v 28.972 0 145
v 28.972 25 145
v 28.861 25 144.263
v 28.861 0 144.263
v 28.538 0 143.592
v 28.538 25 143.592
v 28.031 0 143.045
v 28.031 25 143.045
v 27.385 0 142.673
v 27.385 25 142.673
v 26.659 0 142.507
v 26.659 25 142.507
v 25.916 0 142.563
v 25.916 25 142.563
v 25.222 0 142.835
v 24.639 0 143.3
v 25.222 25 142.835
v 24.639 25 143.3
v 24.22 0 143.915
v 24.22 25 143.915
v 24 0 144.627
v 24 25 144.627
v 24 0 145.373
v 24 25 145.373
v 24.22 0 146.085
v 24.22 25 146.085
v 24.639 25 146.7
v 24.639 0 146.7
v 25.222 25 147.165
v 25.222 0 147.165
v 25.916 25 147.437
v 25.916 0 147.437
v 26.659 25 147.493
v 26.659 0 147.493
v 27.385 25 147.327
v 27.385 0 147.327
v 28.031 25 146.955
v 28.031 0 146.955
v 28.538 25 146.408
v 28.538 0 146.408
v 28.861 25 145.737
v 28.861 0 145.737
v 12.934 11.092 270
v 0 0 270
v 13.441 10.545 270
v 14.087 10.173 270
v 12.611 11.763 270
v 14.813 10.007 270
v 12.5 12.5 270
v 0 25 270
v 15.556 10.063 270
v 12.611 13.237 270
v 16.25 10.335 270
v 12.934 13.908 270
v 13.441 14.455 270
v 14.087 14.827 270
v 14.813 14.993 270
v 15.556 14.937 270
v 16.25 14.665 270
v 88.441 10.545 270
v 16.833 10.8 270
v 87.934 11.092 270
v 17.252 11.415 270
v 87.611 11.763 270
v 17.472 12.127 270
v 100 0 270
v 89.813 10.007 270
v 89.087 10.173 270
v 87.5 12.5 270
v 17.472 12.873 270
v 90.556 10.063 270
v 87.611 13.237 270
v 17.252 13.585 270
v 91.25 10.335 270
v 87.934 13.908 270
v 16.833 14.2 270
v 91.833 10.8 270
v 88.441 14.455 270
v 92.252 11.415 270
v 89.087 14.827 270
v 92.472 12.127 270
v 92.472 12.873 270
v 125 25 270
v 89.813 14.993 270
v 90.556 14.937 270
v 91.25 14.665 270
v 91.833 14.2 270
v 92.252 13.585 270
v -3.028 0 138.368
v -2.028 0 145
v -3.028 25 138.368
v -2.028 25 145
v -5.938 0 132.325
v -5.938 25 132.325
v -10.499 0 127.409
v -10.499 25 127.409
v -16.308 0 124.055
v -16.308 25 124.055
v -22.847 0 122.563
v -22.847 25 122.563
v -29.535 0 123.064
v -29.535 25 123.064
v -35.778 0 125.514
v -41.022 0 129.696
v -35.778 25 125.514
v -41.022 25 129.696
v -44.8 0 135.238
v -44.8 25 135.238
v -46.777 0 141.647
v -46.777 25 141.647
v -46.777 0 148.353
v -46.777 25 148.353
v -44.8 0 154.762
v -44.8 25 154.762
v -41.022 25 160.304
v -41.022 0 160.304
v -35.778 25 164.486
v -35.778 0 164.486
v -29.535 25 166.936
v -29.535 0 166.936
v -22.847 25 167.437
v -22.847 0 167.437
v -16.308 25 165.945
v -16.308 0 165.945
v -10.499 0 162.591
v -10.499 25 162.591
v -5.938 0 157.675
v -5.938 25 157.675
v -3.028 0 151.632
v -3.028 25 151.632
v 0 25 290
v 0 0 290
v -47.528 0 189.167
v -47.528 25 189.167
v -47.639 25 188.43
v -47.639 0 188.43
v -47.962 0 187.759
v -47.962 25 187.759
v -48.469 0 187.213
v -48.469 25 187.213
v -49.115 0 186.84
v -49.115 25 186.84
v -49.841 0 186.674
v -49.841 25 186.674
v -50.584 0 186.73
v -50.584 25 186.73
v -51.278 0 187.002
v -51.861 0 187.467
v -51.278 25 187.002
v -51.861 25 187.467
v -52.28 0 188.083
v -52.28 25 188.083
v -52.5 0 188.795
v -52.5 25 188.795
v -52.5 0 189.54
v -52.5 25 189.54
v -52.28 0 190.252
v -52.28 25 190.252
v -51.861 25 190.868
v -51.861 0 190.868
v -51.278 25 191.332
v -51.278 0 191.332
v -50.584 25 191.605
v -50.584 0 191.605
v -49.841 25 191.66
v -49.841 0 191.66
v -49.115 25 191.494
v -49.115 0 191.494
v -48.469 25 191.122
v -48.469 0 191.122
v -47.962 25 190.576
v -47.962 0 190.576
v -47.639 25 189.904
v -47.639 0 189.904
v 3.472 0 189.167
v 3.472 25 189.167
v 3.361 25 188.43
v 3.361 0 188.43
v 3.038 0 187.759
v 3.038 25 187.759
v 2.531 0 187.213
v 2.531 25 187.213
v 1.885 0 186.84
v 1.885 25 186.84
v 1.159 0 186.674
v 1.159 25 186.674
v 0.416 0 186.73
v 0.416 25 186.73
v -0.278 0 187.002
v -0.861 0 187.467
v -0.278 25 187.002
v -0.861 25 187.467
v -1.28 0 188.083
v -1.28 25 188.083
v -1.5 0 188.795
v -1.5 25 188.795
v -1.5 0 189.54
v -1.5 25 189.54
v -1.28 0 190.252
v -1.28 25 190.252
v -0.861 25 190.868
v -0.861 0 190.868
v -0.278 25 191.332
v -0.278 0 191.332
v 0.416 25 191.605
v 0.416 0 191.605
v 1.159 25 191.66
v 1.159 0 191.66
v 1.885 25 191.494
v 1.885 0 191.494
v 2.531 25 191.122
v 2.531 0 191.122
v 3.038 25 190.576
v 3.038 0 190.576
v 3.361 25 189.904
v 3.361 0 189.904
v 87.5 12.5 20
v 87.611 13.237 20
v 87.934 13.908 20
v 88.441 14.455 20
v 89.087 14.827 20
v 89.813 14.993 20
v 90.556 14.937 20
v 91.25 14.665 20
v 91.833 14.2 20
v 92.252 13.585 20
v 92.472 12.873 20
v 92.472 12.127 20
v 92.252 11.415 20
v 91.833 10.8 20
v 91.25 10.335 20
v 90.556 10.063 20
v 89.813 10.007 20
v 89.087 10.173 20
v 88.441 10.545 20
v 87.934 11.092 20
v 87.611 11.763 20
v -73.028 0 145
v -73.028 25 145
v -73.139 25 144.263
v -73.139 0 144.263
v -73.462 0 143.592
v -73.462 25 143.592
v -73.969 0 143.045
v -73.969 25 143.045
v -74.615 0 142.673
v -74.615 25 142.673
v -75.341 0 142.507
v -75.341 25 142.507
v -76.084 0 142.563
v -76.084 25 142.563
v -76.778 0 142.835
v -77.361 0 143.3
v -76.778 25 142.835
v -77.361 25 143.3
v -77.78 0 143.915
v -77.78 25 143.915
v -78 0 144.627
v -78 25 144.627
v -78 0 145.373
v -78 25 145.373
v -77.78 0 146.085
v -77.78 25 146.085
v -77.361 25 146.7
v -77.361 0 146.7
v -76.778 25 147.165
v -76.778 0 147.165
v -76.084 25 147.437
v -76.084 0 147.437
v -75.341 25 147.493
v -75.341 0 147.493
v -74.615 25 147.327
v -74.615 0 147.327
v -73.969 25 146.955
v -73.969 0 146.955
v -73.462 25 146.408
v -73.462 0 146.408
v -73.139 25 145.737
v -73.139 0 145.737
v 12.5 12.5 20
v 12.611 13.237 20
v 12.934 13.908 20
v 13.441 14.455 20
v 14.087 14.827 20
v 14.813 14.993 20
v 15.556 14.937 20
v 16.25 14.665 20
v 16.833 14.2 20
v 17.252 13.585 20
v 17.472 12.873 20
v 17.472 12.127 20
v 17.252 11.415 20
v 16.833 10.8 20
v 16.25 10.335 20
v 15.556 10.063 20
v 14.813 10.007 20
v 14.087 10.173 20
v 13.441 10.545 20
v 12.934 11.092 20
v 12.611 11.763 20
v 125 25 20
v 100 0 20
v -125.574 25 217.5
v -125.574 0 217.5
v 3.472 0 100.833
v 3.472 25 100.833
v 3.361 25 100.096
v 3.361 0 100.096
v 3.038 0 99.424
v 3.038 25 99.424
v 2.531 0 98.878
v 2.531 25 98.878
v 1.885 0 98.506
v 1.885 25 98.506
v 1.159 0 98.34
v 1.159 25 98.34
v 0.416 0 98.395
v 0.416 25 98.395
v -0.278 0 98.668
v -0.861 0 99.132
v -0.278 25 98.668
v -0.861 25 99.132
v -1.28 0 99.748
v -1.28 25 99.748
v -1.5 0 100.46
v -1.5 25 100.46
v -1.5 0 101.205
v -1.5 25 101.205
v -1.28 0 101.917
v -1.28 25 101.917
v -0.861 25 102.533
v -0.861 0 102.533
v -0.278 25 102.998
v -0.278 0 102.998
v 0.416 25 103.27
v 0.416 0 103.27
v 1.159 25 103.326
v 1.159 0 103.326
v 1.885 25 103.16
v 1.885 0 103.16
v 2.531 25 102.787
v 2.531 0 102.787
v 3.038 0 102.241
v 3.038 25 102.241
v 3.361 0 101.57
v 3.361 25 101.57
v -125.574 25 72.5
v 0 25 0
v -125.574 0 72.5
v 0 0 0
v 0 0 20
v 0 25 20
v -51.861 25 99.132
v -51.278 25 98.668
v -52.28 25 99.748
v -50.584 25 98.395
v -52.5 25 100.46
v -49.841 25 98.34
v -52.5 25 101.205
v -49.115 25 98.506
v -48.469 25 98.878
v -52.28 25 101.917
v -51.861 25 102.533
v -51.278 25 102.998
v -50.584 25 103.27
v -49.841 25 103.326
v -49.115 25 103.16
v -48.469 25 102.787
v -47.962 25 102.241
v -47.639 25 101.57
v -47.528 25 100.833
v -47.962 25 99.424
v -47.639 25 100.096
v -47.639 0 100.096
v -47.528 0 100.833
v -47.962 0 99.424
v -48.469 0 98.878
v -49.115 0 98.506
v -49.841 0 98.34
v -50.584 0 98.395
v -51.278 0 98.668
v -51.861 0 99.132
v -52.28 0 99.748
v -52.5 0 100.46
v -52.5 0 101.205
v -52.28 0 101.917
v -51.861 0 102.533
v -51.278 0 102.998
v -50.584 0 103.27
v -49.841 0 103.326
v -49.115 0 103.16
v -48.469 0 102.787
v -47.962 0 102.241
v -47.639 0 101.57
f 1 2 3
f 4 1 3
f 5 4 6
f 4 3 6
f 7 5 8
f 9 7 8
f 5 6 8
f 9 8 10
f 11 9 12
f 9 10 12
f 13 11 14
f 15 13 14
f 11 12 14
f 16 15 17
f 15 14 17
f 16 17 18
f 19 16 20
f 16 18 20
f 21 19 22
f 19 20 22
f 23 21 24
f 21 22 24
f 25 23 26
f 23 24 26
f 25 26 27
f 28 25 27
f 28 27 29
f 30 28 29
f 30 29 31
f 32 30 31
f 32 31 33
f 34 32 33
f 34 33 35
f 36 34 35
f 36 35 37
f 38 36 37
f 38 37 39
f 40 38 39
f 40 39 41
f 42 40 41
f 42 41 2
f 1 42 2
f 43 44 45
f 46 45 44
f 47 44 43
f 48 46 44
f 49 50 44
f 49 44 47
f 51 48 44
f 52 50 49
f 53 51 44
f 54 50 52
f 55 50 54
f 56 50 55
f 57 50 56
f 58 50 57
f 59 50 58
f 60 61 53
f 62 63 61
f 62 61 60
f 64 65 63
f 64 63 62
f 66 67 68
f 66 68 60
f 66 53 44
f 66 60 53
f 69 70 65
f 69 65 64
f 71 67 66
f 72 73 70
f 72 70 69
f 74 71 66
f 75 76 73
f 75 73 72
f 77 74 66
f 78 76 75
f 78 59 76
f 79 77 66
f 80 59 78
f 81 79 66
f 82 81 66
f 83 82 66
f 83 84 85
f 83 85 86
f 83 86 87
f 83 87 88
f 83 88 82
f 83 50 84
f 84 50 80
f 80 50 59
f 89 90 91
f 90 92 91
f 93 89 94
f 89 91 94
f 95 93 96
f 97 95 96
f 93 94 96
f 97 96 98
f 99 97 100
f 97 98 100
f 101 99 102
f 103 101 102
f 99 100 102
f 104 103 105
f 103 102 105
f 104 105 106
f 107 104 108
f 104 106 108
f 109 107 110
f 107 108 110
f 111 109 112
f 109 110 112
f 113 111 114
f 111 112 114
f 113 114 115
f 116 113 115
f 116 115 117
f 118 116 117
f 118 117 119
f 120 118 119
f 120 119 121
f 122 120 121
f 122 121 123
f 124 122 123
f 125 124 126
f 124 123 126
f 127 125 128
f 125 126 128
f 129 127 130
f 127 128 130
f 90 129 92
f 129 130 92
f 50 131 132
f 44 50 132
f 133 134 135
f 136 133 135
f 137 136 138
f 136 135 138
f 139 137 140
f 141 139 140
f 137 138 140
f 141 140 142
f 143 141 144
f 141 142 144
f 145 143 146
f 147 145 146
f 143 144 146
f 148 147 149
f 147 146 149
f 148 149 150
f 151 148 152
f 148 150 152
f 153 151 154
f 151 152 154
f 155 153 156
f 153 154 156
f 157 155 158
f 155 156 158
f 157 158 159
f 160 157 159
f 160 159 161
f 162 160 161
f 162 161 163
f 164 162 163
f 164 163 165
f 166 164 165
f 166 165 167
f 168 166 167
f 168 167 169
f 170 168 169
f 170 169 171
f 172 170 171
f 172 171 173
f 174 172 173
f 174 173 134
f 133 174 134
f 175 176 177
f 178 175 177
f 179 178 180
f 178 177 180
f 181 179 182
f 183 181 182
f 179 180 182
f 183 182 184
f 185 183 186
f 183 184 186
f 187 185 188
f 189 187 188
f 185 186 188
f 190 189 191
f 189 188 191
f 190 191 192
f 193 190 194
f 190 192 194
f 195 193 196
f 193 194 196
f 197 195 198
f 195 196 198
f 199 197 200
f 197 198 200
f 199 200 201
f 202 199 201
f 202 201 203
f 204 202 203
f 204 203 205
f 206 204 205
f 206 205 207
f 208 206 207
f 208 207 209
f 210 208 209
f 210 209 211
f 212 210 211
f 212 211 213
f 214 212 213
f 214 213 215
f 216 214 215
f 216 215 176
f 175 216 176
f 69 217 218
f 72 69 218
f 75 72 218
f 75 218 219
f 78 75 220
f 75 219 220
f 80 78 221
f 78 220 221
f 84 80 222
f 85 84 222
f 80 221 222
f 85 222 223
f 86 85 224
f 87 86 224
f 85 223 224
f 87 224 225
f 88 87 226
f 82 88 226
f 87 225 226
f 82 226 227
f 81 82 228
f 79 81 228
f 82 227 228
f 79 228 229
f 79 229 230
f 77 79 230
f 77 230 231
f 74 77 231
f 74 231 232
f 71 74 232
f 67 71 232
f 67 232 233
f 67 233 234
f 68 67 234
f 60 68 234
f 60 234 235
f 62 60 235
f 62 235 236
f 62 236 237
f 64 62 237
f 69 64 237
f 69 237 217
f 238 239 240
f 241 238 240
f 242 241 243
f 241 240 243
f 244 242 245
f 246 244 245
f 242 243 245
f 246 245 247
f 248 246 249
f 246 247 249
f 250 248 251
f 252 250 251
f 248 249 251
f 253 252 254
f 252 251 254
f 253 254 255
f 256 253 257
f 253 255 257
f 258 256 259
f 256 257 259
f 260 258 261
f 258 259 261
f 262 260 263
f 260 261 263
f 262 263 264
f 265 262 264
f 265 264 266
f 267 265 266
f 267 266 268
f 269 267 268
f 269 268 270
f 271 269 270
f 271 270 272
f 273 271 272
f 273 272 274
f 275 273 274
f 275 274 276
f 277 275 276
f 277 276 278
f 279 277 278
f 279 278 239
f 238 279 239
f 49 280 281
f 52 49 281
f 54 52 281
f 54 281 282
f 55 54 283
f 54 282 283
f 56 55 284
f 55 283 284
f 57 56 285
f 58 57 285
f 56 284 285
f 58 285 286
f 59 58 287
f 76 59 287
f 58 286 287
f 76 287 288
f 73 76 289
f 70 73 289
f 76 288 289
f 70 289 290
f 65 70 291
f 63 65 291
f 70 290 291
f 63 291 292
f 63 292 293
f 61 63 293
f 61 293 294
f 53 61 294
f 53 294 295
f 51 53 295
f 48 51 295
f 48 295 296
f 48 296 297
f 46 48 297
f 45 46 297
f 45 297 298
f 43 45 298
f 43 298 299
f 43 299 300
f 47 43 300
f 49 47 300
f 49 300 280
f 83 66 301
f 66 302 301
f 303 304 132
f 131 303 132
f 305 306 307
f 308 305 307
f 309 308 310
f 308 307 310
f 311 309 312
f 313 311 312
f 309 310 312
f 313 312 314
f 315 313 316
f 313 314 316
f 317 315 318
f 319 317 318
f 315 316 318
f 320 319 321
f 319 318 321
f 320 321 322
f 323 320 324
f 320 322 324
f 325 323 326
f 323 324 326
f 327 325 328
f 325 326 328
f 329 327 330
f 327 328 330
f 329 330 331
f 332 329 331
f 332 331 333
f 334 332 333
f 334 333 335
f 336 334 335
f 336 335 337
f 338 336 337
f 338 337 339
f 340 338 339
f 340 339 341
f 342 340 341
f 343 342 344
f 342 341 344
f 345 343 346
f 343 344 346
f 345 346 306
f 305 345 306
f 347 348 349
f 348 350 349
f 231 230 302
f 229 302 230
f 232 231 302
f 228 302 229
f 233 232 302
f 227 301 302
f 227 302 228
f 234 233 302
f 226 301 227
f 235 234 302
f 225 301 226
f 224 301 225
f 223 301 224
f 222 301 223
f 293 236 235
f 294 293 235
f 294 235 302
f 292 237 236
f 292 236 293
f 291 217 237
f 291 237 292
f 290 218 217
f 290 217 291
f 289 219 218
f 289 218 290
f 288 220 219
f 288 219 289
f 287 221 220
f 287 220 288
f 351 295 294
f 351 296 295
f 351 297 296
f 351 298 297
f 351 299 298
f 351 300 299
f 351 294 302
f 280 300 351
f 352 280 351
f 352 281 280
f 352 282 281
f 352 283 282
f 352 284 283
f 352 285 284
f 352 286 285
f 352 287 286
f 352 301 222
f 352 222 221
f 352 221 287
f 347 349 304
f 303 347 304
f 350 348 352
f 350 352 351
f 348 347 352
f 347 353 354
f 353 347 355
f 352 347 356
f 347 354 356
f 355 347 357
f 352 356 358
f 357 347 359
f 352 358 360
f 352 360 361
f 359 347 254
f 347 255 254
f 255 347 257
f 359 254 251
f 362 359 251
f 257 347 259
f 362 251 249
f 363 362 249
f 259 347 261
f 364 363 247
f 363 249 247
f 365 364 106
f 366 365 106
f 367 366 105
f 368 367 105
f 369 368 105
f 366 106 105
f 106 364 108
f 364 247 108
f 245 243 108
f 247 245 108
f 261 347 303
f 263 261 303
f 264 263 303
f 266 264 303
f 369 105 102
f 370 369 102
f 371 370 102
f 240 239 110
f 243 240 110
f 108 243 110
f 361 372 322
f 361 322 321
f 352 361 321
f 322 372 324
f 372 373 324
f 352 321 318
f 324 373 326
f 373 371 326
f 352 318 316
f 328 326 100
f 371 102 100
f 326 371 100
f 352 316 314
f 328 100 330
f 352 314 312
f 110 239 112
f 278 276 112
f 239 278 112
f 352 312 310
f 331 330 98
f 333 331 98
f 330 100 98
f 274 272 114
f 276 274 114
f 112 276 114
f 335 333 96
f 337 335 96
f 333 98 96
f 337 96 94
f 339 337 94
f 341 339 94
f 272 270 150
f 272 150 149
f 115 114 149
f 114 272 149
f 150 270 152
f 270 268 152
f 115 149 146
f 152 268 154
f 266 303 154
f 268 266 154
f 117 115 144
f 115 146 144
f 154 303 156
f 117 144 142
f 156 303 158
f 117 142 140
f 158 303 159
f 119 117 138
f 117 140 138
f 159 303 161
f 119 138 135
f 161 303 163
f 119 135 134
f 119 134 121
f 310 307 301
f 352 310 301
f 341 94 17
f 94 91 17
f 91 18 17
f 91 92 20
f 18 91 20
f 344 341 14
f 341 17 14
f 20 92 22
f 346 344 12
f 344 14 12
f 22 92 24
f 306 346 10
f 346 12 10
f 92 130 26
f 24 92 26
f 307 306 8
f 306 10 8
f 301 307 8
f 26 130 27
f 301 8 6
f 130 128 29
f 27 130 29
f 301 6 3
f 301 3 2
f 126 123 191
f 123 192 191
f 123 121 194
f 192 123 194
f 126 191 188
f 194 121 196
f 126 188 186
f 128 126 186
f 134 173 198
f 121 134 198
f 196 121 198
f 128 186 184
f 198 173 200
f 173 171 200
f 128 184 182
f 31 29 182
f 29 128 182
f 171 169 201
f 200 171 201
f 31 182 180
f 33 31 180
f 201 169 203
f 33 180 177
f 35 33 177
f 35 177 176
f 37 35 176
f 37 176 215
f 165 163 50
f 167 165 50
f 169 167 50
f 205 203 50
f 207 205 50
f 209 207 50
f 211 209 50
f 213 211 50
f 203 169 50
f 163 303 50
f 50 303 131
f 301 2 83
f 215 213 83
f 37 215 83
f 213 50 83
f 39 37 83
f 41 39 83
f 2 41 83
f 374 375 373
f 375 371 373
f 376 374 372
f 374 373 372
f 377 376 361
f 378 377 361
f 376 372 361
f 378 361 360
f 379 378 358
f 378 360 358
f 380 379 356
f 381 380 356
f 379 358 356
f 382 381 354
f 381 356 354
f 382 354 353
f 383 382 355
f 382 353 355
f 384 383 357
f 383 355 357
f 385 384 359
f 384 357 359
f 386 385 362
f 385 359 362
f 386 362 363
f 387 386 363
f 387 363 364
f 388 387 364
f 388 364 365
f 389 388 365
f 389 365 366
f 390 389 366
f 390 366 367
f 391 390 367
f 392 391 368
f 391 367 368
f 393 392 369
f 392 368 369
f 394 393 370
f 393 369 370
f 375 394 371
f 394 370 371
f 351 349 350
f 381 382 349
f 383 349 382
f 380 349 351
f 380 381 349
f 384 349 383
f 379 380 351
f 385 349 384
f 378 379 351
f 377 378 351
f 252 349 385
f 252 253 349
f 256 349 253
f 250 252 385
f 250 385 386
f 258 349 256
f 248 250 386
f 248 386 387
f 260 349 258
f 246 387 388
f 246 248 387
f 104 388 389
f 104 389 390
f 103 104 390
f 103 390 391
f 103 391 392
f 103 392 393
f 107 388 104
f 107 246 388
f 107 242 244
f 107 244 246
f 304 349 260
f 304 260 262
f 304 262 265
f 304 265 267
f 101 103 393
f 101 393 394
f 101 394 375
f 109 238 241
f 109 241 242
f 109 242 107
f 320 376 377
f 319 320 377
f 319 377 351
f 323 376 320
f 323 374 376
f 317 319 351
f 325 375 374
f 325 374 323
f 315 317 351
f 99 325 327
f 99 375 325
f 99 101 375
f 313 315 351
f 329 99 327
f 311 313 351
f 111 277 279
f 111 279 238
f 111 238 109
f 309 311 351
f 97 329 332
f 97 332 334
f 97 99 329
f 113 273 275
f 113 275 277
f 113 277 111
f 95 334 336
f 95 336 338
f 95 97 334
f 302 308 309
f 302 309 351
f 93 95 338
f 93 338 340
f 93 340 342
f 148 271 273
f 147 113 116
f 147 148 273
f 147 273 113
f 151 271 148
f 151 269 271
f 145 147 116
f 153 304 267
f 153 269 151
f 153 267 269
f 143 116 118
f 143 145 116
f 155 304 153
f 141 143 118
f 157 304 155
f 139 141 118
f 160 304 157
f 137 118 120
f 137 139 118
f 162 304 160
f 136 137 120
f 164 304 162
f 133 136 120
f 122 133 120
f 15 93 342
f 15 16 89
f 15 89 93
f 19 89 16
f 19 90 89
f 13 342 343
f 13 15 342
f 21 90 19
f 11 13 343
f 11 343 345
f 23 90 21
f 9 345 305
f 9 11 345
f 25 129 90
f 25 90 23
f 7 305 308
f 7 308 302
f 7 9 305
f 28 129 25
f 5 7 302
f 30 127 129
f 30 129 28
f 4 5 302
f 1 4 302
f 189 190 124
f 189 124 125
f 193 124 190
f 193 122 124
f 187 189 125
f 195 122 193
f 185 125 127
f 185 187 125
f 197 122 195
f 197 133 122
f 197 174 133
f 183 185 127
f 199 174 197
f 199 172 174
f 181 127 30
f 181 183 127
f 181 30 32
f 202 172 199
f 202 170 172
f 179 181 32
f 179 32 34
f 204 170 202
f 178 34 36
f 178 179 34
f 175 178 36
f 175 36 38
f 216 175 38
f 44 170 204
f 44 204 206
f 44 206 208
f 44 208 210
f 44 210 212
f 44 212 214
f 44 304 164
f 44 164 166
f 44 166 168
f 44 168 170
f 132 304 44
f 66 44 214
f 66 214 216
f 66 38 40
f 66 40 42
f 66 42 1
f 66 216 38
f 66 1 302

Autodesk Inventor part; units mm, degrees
ref_plane "XZ Plane" through (0, 0, 0) normal (0, 1, 0) x (-1, 0, 0)
ref_plane "XY Plane" through (0, 0, 0) normal (0, 0, 1) x (1, 0, 0)
sketch "Sketch1" plane through (0, 0, 0) normal (0, 0, 1) x (1, 0, 0)
  line L0 (0, 0) -> (100, 0)
  line L1 (100, 0) -> (100, 25)
  line L2 (100, 25) -> (0, 25)
  line L3 (0, 25) -> (0, 0)
  line L4 (0, 25) -> (115.2078, 140.2078)
  line L5 (100, 0) -> (177.7078, 77.7078)
  line L6 (151.2922, 176.2922) -> (200.5844, 163.0844)
  line L7 (200.5844, 163.0844) -> (213.7922, 113.7922)
  line L8 (213.7922, 113.7922) -> (177.7078, 77.7078)
  line L9 (177.7078, 77.7078) -> (128.4156, 90.9156)
  line L10 (128.4156, 90.9156) -> (115.2078, 140.2078)
  line L11 (115.2078, 140.2078) -> (151.2922, 176.2922)
  circle A0 centre (164.5, 127) radius 4
  dimension "d0" = 100
  dimension "d1" = 25
  dimension "d6" = 8
  dimension "d8" = 45
  dimension "d15" = 127
extrude "Extrusion1" add sketch "Sketch1" along normal blind 20
sketch "Sketch2" plane through (0, 0, 20) normal (0, 0, 1) x (1, 0, 0)
  line L0 (0, 25) -> (0, 0) projected
  line L1 (0, 0) -> (100, 0) projected
  line L2 (0, 25) -> (100, 25)
  line L3 (100, 25) -> (100, 0)
  line L4 (100, 0) -> (0, 0)
  line L5 (0, 0) -> (0, 25)
  line L6 (100, 25) -> (125, 25)
  line L7 (100, 0) -> (213.7922, 113.7922) projected
  line L8 (100, 0) -> (125, 25)
extrude "Extrusion2" add sketch "Sketch2" along normal blind 250
sketch "Sketch4" plane through (0, 0, 270) normal (0, 0, 1) x (1, 0, 0)
  line L0 (0, 25) -> (125, 25) projected
  line L1 (125, 25) -> (213.7922, 113.7922) projected
  line L2 (213.7922, 113.7922) -> (200.5844, 163.0844) projected
  line L3 (200.5844, 163.0844) -> (151.2922, 176.2922) projected
  line L4 (151.2922, 176.2922) -> (0, 25) projected
  circle A0 centre (164.5, 127) radius 4 projected
  line L5 (100, 0) -> (125, 25) projected
  line L6 (125, 25) -> (0, 25) projected
  line L7 (0, 25) -> (0, 0) projected
  line L8 (0, 0) -> (100, 0) projected
extrude "Extrusion3" add sketch "Sketch4" along normal blind 20
sketch "Sketch5" plane through (0, 0, 0) normal (0, -1, 0) x (1, 0, 0)
  line L0 (0, 0) -> (100, 0) projected
  line L1 (100, 0) -> (100, 290) projected
  line L2 (0, 290) -> (100, 290) projected
  line L3 (0, 0) -> (0, 290) projected
  line L4 (0, 0) -> (-125.5737, 72.5)
  line L5 (-125.5737, 72.5) -> (-125.5737, 217.5)
  line L6 (-125.5737, 217.5) -> (0, 290)
  line L7 (0, 290) -> (125.5737, 217.5)
  line L8 (125.5737, 217.5) -> (125.5737, 72.5)
  line L9 (125.5737, 72.5) -> (0, 0)
  point P0 (0, 145)
extrude "Extrusion4" add sketch "Sketch5" against normal blind 25 contours L4 L5 L6 L3
sketch "Sketch6" plane through (0, 25, 20) normal (0, 1, 0) x (1, 0, 0)
  line L0 (100, 20) -> (100, -270) projected
  circle A0 centre (-24.528, -125) radius 3
  circle A1 centre (-31.528, -125) radius 1.5
  circle A2 centre (-21.028, -131.0622) radius 1.5
  circle A3 centre (-21.028, -118.9378) radius 1.5
  point P0 (0, 20)
  point P1 (100, -125)
  dimension "d18" = 6
  dimension "d19" = 124.528
  dimension "d20" = 3
  dimension "d21" = 7
  dimension "d24" = 360
extrude "Extrusion5" cut sketch "Sketch6" against normal through all
sketch "Sketch7" plane through (100, 0, 0) normal (0, -1, 0) x (1, 0, 0)
  circle A0 centre (-124.528, 145) radius 3 projected
  circle A1 centre (-124.528, 145) radius 12
  point P0 (-100, 0)
  dimension "d28" = 24
extrude "Extrusion6" cut sketch "Sketch7" against normal blind 5
sketch "Sketch8" plane through (0, 0, 270) normal (0, 0, -1) x (-1, 0, 0)
  circle A0 centre (-164.5, 127) radius 4 projected
  circle A1 centre (-164.5, 127) radius 12.5
  point P0 (0, 0)
  dimension "d31" = 25
extrude "Extrusion7" cut sketch "Sketch8" against normal blind 7
sketch "Sketch10" plane through (164.5, 127, 277) normal (0, 0, -1) x (-1, 0, 0)
  circle A0 centre (7, 0) radius 2
  circle A1 centre (0, 0) radius 4 projected
  circle A2 centre (-3.5, 6.0622) radius 2
  circle A3 centre (-3.5, -6.0622) radius 2
  point P0 (164.5, -127)
  dimension "d34" = 4
  dimension "d37" = 360
  dimension "d39" = 7
extrude "Extrusion8" cut sketch "Sketch10" against normal through all
sketch "Sketch11" plane through (0, 0, 290) normal (0, 0, 1) x (1, 0, 0)
  circle A0 centre (168, 133.0622) radius 2 projected
  circle A1 centre (164.5, 127) radius 4 projected
  circle A2 centre (168, 133.0622) radius 4
  circle A3 centre (157.5, 127) radius 4
  circle A4 centre (168, 120.9378) radius 4
  point P0 (0, 0)
  dimension "d42" = 8
  dimension "d45" = 360
extrude "Extrusion9" cut sketch "Sketch11" against normal blind 3 contours A0 | A1 A4 A3 A2 | A2 A1 | A1 A2 | A4 A1 | A1 A4 | A3 A1 | A1 A3
ref_plane "Work Plane1" through (164.5, 127, 270) normal (1, 0, 0) x (0, 0, 1)
sketch "Sketch12" plane through (164.5, 127, 270) normal (1, 0, 0) x (0, 0, 1)
  line L0 (17, -1.9365) -> (17, 1.9365) projected
  line L1 (17, 1.9365) -> (20, 1.9365) projected
  line L2 (20, 3.9993) -> (20, 1.9365) projected
  line L3 (20, 3.9993) -> (17, 3.9993) projected
  line L4 (17, 3.9993) -> (17, 2.0628) projected
  line L5 (17, 2.0628) -> (20, 2.0628) projected
  line L6 (20, -2.0628) -> (20, 2.0628) projected
  line L7 (20, -2.0628) -> (17, -2.0628) projected
  line L8 (17, -2.0628) -> (17, -3.9993) projected
  line L9 (17, -3.9993) -> (20, -3.9993) projected
  line L10 (20, -1.9365) -> (20, -3.9993) projected
  line L11 (20, -1.9365) -> (17, -1.9365) projected
  line L12 (7, 4) -> (7, -4) projected
  line L13 (7, -12.5) -> (7, 12.5) projected
  line L14 (0, -12.5) -> (0, 12.5) projected
  circle A0 centre (3.5, 0) radius 2
  line L15 (0, -12.5) -> (7, -12.5) projected
  point P0 (-270, 127)
  point P1 (7, 0)
  point P2 (3.5, -12.5)
  dimension "d50" = 4
extrude "Extrusion10" cut sketch "Sketch12" along normal through all contours A0
sketch "Sketch13" plane through (0, 0, 290) normal (0, 0, 1) x (1, 0, 0)
  line L0 (100, 0) -> (213.7922, 113.7922) projected
  line L1 (213.7922, 113.7922) -> (200.5844, 163.0844) projected
  line L2 (200.5844, 163.0844) -> (151.2922, 176.2922) projected
  line L3 (151.2922, 176.2922) -> (0, 25) projected
  line L4 (0, 25) -> (0, 0) projected
  line L5 (0, 0) -> (100, 0) projected
  arc A0 (161, 128.9365) -> (161, 125.0635) centre (157.5, 127) ccw projected
  arc A1 (164.5729, 130.9993) -> (161, 128.9365) centre (164.5, 127) ccw projected
  arc A2 (167.9271, 129.0628) -> (164.5729, 130.9993) centre (168, 133.0622) ccw projected
  arc A3 (167.9271, 124.9372) -> (167.9271, 129.0628) centre (164.5, 127) ccw projected
  arc A4 (164.5729, 123.0007) -> (167.9271, 124.9372) centre (168, 120.9378) ccw projected
  arc A5 (161, 125.0635) -> (164.5729, 123.0007) centre (164.5, 127) ccw projected
extrude "Extrusion11" cut sketch "Sketch13" against normal blind 20 contours L5 L4 L3 L2 L1 L0 | A1 A2 A3 A4 A5 A0
sketch "Sketch14" plane through (0, 0, 0) normal (0, 0, -1) x (-1, 0, 0)
  circle A0 centre (-164.5, 127) radius 4 projected
  line L0 (0, 0) -> (-100, 0) projected
  line L1 (0, 25) -> (0, 0) projected
  line L2 (-151.2922, 176.2922) -> (0, 25) projected
  line L3 (-200.5844, 163.0844) -> (-151.2922, 176.2922) projected
  line L4 (-213.7922, 113.7922) -> (-200.5844, 163.0844) projected
  line L5 (-100, 0) -> (-213.7922, 113.7922) projected
extrude "Extrusion12" cut sketch "Sketch14" against normal blind 20
sketch "Sketch15" plane through (0, 0, 20) normal (0, 0, -1) x (-1, 0, 0)
  circle A0 centre (-90, 12.5) radius 2.5
  circle A1 centre (-15, 12.5) radius 2.5
  line L0 (-90, 12.5) -> (-15, 12.5) construction
  line L1 (0, 0) -> (-100, 0) projected
  dimension "d57" = 5
  dimension "d58" = 5
  dimension "d59" = 75
  dimension "d60" = 12.5
  dimension "d61" = 10
extrude "Extrusion13" cut sketch "Sketch15" against normal through all
sketch "Sketch16" plane through (-125.5737, 25, 217.5) normal (0, 1, 0) x (1, 0, 0)
  circle A0 centre (101.0457, 72.5) radius 22.5
  circle A1 centre (101.0457, 72.5) radius 3 construction
  point P0 (125.5737, 217.5)
  dimension "d64" = 45
extrude "Extrusion14" cut sketch "Sketch16" against normal through all
sketch "Sketch17" plane through (-125.5737, 25, 217.5) normal (0, 1, 0) x (1, 0, 0)
  circle A0 centre (50.0457, 72.5) radius 2.5
  circle A1 centre (101.0457, 72.5) radius 22.5 construction
  circle A2 centre (75.5457, 28.3327) radius 2.5
  circle A3 centre (126.5457, 28.3327) radius 2.5
  circle A4 centre (152.0457, 72.5) radius 2.5
  circle A5 centre (126.5457, 116.6673) radius 2.5
  circle A6 centre (75.5457, 116.6673) radius 2.5
  point P0 (125.5737, 217.5)
  dimension "d68" = 5
  dimension "d69" = 51
  dimension "d72" = 360
extrude "Extrusion15" cut sketch "Sketch17" against normal through all
properties part number "HA02" material "ABS Plastic"
